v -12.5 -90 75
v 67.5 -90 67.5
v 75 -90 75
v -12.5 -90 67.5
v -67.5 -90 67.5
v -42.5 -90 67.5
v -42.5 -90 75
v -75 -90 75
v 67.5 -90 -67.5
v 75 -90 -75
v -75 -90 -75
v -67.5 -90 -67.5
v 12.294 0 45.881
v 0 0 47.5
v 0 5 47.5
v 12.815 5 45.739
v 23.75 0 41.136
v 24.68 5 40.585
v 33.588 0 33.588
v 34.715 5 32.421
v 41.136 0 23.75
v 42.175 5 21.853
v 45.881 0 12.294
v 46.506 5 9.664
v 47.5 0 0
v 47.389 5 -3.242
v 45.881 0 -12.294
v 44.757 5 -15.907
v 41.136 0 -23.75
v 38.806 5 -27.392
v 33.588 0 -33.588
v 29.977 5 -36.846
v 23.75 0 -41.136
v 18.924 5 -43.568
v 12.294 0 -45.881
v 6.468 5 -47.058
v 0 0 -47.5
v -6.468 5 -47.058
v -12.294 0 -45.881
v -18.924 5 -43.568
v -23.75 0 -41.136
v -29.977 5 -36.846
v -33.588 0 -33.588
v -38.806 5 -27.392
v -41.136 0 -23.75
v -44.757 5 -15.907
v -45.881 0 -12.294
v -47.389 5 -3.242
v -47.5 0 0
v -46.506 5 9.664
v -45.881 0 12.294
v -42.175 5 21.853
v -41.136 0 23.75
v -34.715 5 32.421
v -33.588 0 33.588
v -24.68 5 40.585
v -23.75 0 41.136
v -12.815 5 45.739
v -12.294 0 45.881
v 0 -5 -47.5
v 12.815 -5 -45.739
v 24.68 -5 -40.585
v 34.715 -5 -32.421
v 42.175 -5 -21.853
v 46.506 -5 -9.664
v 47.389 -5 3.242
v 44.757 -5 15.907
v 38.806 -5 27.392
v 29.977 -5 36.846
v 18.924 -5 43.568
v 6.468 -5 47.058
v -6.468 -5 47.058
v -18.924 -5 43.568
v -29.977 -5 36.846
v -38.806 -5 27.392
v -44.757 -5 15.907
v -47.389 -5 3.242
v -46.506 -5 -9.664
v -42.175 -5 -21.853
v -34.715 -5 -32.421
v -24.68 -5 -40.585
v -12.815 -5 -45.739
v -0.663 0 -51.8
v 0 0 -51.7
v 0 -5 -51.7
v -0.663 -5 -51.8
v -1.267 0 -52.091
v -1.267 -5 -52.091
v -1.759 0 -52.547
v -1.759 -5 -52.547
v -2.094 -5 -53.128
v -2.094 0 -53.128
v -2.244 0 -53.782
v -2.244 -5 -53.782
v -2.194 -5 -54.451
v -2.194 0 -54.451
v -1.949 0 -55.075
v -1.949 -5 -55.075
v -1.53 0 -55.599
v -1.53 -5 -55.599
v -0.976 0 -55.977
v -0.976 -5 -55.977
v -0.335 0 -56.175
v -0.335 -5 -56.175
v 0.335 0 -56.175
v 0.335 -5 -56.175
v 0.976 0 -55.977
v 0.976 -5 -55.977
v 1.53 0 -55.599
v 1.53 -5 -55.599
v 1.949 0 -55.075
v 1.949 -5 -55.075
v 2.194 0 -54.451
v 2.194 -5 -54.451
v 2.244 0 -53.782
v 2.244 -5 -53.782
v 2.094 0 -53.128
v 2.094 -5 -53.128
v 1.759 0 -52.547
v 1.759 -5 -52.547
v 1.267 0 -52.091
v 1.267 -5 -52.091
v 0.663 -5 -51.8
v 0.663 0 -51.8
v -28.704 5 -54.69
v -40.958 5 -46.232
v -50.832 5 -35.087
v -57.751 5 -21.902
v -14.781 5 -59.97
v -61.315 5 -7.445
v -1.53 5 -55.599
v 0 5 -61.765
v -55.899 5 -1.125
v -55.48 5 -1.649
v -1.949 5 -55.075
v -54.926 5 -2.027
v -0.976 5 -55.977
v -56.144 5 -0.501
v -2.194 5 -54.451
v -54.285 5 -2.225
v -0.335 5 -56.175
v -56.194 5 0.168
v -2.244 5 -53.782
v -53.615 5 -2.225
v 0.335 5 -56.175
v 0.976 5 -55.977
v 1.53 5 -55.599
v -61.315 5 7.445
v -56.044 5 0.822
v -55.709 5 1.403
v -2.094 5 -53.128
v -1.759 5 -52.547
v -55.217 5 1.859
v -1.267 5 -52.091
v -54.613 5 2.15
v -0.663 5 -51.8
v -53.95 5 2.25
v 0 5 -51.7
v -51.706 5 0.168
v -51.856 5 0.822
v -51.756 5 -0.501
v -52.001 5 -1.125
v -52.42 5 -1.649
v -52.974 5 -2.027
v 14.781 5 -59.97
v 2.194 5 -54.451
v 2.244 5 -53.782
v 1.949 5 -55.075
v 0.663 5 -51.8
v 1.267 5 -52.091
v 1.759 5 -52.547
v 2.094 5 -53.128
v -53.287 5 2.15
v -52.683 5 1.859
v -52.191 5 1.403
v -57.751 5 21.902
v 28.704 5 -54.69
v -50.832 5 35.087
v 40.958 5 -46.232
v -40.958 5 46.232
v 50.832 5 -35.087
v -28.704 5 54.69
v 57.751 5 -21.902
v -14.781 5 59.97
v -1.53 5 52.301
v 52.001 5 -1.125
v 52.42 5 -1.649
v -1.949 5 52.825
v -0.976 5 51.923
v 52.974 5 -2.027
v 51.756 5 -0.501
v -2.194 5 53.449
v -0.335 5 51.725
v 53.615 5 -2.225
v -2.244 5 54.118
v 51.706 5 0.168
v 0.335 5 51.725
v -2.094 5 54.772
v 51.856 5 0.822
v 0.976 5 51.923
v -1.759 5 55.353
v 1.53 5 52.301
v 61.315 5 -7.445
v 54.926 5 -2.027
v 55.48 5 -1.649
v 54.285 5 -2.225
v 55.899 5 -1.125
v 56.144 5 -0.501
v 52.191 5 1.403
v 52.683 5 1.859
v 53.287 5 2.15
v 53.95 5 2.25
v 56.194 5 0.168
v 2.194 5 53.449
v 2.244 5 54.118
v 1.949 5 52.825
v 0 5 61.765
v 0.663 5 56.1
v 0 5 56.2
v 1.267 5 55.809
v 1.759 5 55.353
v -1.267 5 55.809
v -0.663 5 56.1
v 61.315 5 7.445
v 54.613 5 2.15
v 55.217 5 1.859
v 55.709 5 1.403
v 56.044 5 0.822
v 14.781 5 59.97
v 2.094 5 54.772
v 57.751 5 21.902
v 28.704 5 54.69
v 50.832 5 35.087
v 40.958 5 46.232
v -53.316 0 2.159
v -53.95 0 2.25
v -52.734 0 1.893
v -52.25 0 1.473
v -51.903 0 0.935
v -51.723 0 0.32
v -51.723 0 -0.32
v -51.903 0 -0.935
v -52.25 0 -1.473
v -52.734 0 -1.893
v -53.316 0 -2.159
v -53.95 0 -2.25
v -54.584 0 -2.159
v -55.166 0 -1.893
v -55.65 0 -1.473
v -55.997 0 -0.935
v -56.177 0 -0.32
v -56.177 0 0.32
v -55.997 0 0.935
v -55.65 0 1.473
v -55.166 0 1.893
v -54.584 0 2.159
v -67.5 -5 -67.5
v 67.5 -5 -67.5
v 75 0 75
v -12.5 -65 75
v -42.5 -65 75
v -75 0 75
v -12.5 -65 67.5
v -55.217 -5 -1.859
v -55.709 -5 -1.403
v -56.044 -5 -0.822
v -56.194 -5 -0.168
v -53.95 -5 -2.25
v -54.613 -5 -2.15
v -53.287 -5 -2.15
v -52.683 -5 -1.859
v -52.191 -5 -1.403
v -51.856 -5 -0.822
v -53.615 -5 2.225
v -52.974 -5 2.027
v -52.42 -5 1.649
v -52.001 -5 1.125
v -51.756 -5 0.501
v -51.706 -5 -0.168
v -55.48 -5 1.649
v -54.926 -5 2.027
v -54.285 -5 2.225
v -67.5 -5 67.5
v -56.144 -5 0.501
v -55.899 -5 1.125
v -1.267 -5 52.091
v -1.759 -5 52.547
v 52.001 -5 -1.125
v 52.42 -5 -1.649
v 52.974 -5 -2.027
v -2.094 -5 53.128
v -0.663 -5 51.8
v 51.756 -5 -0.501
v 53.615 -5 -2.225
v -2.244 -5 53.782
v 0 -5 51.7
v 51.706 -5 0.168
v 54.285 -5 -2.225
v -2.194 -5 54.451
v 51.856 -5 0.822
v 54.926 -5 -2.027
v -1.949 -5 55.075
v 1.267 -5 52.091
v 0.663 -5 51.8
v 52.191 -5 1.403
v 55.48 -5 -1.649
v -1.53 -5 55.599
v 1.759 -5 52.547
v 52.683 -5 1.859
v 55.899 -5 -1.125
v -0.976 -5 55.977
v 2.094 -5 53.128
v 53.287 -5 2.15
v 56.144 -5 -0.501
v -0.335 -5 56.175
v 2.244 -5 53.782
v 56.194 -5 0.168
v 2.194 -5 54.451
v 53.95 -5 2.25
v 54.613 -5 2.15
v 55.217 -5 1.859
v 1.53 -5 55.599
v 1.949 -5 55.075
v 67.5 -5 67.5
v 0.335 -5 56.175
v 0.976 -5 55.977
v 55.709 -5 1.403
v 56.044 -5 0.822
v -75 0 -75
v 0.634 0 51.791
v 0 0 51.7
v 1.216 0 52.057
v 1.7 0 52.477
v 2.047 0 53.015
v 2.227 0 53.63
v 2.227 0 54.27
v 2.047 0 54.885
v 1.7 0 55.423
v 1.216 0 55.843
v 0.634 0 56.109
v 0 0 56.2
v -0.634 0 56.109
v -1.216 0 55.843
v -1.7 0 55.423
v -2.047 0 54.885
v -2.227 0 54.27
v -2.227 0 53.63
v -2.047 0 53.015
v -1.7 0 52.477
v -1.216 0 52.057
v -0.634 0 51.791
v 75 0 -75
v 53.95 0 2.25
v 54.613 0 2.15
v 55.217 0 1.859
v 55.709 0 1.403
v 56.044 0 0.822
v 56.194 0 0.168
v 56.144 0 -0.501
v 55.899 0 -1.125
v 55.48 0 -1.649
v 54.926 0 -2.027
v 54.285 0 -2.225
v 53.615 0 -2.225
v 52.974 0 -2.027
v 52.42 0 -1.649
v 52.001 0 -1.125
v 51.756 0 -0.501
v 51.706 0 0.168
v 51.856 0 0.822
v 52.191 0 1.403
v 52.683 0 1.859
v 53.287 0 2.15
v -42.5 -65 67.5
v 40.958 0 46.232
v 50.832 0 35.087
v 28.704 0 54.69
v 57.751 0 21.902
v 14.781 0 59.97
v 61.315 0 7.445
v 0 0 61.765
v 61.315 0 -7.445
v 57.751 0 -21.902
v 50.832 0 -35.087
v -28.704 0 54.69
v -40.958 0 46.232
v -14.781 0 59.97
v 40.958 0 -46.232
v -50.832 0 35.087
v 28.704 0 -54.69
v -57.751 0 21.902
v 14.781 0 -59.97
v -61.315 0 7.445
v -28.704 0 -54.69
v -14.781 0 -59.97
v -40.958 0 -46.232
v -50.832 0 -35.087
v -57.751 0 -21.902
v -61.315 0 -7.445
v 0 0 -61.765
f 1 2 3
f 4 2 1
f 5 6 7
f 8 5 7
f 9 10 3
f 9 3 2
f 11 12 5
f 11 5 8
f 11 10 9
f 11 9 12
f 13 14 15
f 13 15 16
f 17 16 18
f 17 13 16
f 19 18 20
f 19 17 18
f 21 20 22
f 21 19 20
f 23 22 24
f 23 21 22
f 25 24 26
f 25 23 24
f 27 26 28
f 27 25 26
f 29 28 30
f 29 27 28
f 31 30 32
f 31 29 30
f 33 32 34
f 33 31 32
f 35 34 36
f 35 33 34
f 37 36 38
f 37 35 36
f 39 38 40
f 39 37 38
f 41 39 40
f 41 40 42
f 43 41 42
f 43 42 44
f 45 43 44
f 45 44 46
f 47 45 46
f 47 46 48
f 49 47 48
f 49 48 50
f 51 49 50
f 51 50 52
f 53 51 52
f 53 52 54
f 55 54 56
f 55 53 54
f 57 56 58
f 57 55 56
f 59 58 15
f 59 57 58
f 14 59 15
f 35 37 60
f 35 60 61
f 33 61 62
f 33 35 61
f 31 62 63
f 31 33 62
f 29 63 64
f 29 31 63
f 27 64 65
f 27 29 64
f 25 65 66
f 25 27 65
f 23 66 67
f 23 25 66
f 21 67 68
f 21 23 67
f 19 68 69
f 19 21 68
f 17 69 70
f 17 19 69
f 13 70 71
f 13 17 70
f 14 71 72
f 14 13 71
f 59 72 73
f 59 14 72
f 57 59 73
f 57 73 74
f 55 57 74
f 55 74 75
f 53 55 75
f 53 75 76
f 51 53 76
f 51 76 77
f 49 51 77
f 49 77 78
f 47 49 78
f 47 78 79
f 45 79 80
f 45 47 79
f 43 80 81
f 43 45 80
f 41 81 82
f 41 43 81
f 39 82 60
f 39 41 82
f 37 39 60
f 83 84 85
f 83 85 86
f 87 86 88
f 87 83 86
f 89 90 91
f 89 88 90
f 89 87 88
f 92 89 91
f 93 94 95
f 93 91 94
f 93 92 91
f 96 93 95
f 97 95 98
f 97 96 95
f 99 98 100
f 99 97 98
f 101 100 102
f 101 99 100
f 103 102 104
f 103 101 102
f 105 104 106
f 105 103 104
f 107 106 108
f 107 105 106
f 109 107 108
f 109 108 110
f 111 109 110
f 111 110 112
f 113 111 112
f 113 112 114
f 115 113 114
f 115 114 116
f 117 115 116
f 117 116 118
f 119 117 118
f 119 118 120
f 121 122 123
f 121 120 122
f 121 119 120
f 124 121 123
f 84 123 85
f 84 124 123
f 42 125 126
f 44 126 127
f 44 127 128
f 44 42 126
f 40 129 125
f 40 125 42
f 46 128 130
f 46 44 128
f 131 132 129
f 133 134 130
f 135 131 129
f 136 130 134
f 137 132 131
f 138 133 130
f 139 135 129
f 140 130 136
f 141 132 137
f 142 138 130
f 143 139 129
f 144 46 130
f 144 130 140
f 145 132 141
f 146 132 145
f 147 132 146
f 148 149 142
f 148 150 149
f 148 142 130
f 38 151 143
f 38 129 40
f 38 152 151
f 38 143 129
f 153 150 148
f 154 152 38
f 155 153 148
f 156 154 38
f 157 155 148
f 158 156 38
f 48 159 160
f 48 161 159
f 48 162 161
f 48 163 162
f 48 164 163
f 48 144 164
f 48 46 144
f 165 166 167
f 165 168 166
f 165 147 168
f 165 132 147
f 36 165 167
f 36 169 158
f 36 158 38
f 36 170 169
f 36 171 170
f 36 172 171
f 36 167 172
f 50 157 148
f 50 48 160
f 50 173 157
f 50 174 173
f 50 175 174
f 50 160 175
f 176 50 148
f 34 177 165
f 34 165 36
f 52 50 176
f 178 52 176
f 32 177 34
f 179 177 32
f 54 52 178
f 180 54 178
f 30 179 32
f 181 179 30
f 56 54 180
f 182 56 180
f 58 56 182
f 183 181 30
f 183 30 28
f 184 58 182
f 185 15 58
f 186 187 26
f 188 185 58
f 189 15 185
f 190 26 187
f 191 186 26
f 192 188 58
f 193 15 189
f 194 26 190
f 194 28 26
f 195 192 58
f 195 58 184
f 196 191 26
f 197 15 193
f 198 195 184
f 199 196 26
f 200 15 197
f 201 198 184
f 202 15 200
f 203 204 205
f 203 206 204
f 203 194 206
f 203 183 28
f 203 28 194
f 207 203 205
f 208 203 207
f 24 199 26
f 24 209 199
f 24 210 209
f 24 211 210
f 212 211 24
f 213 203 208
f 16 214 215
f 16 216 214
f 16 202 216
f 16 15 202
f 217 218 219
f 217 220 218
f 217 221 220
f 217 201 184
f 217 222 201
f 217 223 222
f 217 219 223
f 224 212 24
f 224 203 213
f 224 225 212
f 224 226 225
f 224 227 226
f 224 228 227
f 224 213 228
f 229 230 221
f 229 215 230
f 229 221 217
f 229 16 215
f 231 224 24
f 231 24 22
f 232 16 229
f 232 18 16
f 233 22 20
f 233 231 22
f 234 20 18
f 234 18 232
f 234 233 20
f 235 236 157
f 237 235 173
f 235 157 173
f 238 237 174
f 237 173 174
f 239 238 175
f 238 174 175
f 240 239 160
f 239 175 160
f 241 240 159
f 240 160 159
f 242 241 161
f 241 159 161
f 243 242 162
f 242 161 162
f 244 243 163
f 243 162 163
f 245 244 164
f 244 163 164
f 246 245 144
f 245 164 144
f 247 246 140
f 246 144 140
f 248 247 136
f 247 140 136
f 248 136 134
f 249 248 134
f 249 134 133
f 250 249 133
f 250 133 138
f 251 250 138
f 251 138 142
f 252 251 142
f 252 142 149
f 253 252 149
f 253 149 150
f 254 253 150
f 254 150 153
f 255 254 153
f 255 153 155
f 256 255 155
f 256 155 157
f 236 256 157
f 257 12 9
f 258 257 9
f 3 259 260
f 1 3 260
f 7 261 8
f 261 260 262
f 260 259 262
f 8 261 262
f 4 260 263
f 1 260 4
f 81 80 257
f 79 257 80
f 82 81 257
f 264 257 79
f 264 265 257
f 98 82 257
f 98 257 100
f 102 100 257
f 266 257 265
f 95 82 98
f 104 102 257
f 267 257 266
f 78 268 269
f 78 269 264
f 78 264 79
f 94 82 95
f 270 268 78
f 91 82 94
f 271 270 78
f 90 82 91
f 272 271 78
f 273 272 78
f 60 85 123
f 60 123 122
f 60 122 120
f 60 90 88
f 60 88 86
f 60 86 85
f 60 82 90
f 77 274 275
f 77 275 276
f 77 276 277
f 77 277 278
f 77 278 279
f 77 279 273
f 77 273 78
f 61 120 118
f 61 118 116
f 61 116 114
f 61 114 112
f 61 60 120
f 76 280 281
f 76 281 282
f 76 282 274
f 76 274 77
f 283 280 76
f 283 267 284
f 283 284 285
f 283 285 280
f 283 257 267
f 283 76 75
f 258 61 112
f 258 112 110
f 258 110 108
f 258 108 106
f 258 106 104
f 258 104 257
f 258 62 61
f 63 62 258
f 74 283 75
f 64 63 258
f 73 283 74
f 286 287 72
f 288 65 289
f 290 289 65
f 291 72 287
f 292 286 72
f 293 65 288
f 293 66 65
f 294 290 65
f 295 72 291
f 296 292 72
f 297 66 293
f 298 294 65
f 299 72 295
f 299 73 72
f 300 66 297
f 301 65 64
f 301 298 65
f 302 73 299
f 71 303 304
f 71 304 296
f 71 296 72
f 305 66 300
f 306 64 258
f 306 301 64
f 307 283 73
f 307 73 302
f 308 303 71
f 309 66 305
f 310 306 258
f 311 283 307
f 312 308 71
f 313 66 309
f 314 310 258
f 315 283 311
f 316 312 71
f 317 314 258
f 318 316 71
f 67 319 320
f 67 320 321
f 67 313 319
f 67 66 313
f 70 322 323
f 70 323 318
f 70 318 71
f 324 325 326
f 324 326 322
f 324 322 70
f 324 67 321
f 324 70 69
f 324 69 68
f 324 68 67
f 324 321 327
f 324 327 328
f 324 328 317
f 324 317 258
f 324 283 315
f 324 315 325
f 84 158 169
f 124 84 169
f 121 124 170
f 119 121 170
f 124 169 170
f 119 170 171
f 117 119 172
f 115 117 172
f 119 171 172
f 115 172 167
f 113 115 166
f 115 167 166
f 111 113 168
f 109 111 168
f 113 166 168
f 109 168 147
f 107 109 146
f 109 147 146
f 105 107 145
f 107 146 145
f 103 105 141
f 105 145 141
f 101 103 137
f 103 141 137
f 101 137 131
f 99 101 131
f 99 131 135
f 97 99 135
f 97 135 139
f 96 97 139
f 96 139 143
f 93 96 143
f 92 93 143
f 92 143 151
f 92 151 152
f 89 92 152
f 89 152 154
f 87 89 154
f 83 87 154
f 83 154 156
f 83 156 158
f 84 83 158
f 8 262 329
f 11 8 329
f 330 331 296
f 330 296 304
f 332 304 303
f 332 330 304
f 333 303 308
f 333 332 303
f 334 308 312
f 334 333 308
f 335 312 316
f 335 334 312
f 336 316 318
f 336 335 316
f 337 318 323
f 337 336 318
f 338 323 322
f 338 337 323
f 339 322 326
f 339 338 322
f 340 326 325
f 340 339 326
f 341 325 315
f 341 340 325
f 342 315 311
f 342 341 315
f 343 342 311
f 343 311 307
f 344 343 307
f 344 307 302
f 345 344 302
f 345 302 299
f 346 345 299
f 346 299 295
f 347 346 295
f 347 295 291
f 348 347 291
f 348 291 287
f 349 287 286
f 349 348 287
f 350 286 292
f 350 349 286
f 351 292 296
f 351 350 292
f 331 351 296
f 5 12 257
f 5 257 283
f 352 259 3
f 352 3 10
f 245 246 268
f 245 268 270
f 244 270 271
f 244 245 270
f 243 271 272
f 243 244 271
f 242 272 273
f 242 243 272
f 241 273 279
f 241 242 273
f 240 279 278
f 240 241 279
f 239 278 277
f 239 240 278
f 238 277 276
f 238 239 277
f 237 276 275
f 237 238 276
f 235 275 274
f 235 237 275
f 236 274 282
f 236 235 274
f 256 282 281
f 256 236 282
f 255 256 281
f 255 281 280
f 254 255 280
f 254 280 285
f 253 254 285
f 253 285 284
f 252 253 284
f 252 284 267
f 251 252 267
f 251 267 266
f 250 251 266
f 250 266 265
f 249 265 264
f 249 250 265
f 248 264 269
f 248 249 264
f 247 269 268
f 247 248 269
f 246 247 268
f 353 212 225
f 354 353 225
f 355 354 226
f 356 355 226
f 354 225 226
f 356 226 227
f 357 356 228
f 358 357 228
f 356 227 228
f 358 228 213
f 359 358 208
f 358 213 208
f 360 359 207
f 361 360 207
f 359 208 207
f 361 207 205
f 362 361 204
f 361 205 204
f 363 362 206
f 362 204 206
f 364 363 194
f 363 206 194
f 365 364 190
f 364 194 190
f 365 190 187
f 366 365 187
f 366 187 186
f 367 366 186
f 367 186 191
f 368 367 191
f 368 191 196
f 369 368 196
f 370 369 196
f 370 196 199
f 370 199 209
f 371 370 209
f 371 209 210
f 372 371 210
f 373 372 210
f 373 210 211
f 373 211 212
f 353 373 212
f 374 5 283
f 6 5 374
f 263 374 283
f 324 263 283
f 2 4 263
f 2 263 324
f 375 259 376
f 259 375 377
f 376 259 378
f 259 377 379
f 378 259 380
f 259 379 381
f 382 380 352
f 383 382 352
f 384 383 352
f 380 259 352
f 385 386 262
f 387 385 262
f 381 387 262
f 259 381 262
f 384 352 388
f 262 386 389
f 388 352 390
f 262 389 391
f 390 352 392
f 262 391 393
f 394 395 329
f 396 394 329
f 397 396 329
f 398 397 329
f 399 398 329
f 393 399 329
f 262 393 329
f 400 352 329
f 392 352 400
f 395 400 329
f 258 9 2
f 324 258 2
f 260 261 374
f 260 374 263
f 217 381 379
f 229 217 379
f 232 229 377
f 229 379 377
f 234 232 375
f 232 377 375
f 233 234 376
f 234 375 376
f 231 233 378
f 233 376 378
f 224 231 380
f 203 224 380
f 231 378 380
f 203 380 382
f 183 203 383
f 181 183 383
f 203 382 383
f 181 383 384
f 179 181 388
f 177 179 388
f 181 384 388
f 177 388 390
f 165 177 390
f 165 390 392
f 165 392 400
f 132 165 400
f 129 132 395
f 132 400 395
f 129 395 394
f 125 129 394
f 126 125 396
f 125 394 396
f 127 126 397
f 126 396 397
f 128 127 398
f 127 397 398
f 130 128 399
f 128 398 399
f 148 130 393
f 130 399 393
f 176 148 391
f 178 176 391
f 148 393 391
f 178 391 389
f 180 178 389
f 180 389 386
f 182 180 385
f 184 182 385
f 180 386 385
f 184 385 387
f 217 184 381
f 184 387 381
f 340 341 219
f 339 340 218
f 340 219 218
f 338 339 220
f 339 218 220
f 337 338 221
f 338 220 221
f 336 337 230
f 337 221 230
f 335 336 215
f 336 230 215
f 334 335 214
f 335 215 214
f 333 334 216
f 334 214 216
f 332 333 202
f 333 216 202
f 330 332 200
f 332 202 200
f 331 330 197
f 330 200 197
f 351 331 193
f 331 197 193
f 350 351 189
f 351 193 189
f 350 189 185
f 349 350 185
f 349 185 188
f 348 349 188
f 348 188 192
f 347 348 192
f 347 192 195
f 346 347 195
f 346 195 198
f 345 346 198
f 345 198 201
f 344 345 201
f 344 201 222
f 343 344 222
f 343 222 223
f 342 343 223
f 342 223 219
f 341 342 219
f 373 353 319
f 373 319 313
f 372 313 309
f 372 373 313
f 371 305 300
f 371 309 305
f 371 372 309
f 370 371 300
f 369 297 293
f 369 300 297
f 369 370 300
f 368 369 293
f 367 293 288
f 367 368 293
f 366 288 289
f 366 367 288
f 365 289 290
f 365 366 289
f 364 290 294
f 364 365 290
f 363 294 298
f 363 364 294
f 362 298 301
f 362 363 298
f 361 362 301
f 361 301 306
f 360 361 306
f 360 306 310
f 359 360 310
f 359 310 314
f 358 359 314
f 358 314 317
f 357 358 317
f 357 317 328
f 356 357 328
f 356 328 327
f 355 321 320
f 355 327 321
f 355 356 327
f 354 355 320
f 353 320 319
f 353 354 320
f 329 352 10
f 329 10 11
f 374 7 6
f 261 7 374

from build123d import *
from build123d.topology import SkipClean

# Parameters (mm, degrees)
SKETCH1_R           = 61.765082955
SKETCH1_R_2         = 47.5
BOSS_EXTRUDE1_DEPTH = 5
SKETCH7_R           = 2.25
CUT_EXTRUDE1_DEPTH  = 9.5
SKETCH9_W           = 150
SKETCH9_H           = 150
SKETCH9_R           = 2.25
SKETCH9_R_2         = 47.5
BOSS_EXTRUDE2_DEPTH = 90
CUT_EXTRUDE2_DEPTH  = 60
SKETCH10_W          = 135
SKETCH10_H          = 135
CUT_EXTRUDE4_DEPTH  = 85


with BuildPart() as part:
    # Sketch1 → Boss-Extrude1 (new body)
    with BuildSketch(Plane(origin=(0, 0, 0), x_dir=(1, 0, 0), z_dir=(0, 1, 0))):
        with Locations(Location((0, 0, 0), (0, 0, 270))):
            Circle(SKETCH1_R)
        with Locations(Location((0, 0, 0), (0, 0, 270))):
            Circle(SKETCH1_R_2, mode=Mode.SUBTRACT)
    extrude(amount=BOSS_EXTRUDE1_DEPTH)

    # Sketch7 → Cut-Extrude1 (cut)
    with BuildSketch(Plane(origin=(0, 5, 0), x_dir=(1, 0, 0), z_dir=(0, 1, 0))):
        with Locations(Location((0, 53.95, 0), (0, 0, 270))):
            Circle(SKETCH7_R)
        with Locations(Location((0, -53.95, 0), (0, 0, 270))):
            Circle(SKETCH7_R)
        with Locations(Location((53.95, 0, 0), (0, 0, 270))):
            Circle(SKETCH7_R)
        with Locations(Location((-53.95, 0, 0), (0, 0, 270))):
            Circle(SKETCH7_R)
    extrude(amount=-CUT_EXTRUDE1_DEPTH, mode=Mode.SUBTRACT)

    # Sketch9 → Boss-Extrude2 (add)
    with SkipClean():  # the faces are left unmerged after this step: merging them gives an invalid solid
        with BuildSketch(Plane(origin=(0, 0, 0), x_dir=(-1, 0, 0), z_dir=(0, -1, 0))):
            Rectangle(SKETCH9_W, SKETCH9_H)
            with Locations(Location((0, -53.95, 0), (0, 0, 90))):
                Circle(SKETCH9_R, mode=Mode.SUBTRACT)
            with Locations(Location((53.95, 0, 0), (0, 0, 90))):
                Circle(SKETCH9_R, mode=Mode.SUBTRACT)
            with Locations(Location((0, 53.95, 0), (0, 0, 270))):
                Circle(SKETCH9_R, mode=Mode.SUBTRACT)
            with Locations(Location((-53.95, 0, 0), (0, 0, 270))):
                Circle(SKETCH9_R, mode=Mode.SUBTRACT)
            with Locations(Location((0, 0, 0), (0, 0, 90))):
                Circle(SKETCH9_R_2, mode=Mode.SUBTRACT)
        extrude(amount=BOSS_EXTRUDE2_DEPTH)

    # 3DSketch2 → Cut-Extrude2 (cut)
    with SkipClean():  # the faces are left unmerged after this step: merging them gives an invalid solid
        with BuildSketch(Plane(origin=(-42.5, -65, 75), x_dir=(0.7071067811865476, -0.7071067811865476, 0), z_dir=(0, 0, 1))):
            Polygon((0, 0), (21.213203436, 21.213203436), (42.426406871, 0), (21.213203436, -21.213203436), align=None)
        extrude(amount=-CUT_EXTRUDE2_DEPTH, mode=Mode.SUBTRACT)

    # Sketch10 → Cut-Extrude4 (cut)
    with SkipClean():  # the faces are left unmerged after this step: merging them gives an invalid solid
        with BuildSketch(Plane.XZ.offset(90)):
            Rectangle(SKETCH10_W, SKETCH10_H)
        extrude(amount=-CUT_EXTRUDE4_DEPTH, mode=Mode.SUBTRACT)


solid = part.part
